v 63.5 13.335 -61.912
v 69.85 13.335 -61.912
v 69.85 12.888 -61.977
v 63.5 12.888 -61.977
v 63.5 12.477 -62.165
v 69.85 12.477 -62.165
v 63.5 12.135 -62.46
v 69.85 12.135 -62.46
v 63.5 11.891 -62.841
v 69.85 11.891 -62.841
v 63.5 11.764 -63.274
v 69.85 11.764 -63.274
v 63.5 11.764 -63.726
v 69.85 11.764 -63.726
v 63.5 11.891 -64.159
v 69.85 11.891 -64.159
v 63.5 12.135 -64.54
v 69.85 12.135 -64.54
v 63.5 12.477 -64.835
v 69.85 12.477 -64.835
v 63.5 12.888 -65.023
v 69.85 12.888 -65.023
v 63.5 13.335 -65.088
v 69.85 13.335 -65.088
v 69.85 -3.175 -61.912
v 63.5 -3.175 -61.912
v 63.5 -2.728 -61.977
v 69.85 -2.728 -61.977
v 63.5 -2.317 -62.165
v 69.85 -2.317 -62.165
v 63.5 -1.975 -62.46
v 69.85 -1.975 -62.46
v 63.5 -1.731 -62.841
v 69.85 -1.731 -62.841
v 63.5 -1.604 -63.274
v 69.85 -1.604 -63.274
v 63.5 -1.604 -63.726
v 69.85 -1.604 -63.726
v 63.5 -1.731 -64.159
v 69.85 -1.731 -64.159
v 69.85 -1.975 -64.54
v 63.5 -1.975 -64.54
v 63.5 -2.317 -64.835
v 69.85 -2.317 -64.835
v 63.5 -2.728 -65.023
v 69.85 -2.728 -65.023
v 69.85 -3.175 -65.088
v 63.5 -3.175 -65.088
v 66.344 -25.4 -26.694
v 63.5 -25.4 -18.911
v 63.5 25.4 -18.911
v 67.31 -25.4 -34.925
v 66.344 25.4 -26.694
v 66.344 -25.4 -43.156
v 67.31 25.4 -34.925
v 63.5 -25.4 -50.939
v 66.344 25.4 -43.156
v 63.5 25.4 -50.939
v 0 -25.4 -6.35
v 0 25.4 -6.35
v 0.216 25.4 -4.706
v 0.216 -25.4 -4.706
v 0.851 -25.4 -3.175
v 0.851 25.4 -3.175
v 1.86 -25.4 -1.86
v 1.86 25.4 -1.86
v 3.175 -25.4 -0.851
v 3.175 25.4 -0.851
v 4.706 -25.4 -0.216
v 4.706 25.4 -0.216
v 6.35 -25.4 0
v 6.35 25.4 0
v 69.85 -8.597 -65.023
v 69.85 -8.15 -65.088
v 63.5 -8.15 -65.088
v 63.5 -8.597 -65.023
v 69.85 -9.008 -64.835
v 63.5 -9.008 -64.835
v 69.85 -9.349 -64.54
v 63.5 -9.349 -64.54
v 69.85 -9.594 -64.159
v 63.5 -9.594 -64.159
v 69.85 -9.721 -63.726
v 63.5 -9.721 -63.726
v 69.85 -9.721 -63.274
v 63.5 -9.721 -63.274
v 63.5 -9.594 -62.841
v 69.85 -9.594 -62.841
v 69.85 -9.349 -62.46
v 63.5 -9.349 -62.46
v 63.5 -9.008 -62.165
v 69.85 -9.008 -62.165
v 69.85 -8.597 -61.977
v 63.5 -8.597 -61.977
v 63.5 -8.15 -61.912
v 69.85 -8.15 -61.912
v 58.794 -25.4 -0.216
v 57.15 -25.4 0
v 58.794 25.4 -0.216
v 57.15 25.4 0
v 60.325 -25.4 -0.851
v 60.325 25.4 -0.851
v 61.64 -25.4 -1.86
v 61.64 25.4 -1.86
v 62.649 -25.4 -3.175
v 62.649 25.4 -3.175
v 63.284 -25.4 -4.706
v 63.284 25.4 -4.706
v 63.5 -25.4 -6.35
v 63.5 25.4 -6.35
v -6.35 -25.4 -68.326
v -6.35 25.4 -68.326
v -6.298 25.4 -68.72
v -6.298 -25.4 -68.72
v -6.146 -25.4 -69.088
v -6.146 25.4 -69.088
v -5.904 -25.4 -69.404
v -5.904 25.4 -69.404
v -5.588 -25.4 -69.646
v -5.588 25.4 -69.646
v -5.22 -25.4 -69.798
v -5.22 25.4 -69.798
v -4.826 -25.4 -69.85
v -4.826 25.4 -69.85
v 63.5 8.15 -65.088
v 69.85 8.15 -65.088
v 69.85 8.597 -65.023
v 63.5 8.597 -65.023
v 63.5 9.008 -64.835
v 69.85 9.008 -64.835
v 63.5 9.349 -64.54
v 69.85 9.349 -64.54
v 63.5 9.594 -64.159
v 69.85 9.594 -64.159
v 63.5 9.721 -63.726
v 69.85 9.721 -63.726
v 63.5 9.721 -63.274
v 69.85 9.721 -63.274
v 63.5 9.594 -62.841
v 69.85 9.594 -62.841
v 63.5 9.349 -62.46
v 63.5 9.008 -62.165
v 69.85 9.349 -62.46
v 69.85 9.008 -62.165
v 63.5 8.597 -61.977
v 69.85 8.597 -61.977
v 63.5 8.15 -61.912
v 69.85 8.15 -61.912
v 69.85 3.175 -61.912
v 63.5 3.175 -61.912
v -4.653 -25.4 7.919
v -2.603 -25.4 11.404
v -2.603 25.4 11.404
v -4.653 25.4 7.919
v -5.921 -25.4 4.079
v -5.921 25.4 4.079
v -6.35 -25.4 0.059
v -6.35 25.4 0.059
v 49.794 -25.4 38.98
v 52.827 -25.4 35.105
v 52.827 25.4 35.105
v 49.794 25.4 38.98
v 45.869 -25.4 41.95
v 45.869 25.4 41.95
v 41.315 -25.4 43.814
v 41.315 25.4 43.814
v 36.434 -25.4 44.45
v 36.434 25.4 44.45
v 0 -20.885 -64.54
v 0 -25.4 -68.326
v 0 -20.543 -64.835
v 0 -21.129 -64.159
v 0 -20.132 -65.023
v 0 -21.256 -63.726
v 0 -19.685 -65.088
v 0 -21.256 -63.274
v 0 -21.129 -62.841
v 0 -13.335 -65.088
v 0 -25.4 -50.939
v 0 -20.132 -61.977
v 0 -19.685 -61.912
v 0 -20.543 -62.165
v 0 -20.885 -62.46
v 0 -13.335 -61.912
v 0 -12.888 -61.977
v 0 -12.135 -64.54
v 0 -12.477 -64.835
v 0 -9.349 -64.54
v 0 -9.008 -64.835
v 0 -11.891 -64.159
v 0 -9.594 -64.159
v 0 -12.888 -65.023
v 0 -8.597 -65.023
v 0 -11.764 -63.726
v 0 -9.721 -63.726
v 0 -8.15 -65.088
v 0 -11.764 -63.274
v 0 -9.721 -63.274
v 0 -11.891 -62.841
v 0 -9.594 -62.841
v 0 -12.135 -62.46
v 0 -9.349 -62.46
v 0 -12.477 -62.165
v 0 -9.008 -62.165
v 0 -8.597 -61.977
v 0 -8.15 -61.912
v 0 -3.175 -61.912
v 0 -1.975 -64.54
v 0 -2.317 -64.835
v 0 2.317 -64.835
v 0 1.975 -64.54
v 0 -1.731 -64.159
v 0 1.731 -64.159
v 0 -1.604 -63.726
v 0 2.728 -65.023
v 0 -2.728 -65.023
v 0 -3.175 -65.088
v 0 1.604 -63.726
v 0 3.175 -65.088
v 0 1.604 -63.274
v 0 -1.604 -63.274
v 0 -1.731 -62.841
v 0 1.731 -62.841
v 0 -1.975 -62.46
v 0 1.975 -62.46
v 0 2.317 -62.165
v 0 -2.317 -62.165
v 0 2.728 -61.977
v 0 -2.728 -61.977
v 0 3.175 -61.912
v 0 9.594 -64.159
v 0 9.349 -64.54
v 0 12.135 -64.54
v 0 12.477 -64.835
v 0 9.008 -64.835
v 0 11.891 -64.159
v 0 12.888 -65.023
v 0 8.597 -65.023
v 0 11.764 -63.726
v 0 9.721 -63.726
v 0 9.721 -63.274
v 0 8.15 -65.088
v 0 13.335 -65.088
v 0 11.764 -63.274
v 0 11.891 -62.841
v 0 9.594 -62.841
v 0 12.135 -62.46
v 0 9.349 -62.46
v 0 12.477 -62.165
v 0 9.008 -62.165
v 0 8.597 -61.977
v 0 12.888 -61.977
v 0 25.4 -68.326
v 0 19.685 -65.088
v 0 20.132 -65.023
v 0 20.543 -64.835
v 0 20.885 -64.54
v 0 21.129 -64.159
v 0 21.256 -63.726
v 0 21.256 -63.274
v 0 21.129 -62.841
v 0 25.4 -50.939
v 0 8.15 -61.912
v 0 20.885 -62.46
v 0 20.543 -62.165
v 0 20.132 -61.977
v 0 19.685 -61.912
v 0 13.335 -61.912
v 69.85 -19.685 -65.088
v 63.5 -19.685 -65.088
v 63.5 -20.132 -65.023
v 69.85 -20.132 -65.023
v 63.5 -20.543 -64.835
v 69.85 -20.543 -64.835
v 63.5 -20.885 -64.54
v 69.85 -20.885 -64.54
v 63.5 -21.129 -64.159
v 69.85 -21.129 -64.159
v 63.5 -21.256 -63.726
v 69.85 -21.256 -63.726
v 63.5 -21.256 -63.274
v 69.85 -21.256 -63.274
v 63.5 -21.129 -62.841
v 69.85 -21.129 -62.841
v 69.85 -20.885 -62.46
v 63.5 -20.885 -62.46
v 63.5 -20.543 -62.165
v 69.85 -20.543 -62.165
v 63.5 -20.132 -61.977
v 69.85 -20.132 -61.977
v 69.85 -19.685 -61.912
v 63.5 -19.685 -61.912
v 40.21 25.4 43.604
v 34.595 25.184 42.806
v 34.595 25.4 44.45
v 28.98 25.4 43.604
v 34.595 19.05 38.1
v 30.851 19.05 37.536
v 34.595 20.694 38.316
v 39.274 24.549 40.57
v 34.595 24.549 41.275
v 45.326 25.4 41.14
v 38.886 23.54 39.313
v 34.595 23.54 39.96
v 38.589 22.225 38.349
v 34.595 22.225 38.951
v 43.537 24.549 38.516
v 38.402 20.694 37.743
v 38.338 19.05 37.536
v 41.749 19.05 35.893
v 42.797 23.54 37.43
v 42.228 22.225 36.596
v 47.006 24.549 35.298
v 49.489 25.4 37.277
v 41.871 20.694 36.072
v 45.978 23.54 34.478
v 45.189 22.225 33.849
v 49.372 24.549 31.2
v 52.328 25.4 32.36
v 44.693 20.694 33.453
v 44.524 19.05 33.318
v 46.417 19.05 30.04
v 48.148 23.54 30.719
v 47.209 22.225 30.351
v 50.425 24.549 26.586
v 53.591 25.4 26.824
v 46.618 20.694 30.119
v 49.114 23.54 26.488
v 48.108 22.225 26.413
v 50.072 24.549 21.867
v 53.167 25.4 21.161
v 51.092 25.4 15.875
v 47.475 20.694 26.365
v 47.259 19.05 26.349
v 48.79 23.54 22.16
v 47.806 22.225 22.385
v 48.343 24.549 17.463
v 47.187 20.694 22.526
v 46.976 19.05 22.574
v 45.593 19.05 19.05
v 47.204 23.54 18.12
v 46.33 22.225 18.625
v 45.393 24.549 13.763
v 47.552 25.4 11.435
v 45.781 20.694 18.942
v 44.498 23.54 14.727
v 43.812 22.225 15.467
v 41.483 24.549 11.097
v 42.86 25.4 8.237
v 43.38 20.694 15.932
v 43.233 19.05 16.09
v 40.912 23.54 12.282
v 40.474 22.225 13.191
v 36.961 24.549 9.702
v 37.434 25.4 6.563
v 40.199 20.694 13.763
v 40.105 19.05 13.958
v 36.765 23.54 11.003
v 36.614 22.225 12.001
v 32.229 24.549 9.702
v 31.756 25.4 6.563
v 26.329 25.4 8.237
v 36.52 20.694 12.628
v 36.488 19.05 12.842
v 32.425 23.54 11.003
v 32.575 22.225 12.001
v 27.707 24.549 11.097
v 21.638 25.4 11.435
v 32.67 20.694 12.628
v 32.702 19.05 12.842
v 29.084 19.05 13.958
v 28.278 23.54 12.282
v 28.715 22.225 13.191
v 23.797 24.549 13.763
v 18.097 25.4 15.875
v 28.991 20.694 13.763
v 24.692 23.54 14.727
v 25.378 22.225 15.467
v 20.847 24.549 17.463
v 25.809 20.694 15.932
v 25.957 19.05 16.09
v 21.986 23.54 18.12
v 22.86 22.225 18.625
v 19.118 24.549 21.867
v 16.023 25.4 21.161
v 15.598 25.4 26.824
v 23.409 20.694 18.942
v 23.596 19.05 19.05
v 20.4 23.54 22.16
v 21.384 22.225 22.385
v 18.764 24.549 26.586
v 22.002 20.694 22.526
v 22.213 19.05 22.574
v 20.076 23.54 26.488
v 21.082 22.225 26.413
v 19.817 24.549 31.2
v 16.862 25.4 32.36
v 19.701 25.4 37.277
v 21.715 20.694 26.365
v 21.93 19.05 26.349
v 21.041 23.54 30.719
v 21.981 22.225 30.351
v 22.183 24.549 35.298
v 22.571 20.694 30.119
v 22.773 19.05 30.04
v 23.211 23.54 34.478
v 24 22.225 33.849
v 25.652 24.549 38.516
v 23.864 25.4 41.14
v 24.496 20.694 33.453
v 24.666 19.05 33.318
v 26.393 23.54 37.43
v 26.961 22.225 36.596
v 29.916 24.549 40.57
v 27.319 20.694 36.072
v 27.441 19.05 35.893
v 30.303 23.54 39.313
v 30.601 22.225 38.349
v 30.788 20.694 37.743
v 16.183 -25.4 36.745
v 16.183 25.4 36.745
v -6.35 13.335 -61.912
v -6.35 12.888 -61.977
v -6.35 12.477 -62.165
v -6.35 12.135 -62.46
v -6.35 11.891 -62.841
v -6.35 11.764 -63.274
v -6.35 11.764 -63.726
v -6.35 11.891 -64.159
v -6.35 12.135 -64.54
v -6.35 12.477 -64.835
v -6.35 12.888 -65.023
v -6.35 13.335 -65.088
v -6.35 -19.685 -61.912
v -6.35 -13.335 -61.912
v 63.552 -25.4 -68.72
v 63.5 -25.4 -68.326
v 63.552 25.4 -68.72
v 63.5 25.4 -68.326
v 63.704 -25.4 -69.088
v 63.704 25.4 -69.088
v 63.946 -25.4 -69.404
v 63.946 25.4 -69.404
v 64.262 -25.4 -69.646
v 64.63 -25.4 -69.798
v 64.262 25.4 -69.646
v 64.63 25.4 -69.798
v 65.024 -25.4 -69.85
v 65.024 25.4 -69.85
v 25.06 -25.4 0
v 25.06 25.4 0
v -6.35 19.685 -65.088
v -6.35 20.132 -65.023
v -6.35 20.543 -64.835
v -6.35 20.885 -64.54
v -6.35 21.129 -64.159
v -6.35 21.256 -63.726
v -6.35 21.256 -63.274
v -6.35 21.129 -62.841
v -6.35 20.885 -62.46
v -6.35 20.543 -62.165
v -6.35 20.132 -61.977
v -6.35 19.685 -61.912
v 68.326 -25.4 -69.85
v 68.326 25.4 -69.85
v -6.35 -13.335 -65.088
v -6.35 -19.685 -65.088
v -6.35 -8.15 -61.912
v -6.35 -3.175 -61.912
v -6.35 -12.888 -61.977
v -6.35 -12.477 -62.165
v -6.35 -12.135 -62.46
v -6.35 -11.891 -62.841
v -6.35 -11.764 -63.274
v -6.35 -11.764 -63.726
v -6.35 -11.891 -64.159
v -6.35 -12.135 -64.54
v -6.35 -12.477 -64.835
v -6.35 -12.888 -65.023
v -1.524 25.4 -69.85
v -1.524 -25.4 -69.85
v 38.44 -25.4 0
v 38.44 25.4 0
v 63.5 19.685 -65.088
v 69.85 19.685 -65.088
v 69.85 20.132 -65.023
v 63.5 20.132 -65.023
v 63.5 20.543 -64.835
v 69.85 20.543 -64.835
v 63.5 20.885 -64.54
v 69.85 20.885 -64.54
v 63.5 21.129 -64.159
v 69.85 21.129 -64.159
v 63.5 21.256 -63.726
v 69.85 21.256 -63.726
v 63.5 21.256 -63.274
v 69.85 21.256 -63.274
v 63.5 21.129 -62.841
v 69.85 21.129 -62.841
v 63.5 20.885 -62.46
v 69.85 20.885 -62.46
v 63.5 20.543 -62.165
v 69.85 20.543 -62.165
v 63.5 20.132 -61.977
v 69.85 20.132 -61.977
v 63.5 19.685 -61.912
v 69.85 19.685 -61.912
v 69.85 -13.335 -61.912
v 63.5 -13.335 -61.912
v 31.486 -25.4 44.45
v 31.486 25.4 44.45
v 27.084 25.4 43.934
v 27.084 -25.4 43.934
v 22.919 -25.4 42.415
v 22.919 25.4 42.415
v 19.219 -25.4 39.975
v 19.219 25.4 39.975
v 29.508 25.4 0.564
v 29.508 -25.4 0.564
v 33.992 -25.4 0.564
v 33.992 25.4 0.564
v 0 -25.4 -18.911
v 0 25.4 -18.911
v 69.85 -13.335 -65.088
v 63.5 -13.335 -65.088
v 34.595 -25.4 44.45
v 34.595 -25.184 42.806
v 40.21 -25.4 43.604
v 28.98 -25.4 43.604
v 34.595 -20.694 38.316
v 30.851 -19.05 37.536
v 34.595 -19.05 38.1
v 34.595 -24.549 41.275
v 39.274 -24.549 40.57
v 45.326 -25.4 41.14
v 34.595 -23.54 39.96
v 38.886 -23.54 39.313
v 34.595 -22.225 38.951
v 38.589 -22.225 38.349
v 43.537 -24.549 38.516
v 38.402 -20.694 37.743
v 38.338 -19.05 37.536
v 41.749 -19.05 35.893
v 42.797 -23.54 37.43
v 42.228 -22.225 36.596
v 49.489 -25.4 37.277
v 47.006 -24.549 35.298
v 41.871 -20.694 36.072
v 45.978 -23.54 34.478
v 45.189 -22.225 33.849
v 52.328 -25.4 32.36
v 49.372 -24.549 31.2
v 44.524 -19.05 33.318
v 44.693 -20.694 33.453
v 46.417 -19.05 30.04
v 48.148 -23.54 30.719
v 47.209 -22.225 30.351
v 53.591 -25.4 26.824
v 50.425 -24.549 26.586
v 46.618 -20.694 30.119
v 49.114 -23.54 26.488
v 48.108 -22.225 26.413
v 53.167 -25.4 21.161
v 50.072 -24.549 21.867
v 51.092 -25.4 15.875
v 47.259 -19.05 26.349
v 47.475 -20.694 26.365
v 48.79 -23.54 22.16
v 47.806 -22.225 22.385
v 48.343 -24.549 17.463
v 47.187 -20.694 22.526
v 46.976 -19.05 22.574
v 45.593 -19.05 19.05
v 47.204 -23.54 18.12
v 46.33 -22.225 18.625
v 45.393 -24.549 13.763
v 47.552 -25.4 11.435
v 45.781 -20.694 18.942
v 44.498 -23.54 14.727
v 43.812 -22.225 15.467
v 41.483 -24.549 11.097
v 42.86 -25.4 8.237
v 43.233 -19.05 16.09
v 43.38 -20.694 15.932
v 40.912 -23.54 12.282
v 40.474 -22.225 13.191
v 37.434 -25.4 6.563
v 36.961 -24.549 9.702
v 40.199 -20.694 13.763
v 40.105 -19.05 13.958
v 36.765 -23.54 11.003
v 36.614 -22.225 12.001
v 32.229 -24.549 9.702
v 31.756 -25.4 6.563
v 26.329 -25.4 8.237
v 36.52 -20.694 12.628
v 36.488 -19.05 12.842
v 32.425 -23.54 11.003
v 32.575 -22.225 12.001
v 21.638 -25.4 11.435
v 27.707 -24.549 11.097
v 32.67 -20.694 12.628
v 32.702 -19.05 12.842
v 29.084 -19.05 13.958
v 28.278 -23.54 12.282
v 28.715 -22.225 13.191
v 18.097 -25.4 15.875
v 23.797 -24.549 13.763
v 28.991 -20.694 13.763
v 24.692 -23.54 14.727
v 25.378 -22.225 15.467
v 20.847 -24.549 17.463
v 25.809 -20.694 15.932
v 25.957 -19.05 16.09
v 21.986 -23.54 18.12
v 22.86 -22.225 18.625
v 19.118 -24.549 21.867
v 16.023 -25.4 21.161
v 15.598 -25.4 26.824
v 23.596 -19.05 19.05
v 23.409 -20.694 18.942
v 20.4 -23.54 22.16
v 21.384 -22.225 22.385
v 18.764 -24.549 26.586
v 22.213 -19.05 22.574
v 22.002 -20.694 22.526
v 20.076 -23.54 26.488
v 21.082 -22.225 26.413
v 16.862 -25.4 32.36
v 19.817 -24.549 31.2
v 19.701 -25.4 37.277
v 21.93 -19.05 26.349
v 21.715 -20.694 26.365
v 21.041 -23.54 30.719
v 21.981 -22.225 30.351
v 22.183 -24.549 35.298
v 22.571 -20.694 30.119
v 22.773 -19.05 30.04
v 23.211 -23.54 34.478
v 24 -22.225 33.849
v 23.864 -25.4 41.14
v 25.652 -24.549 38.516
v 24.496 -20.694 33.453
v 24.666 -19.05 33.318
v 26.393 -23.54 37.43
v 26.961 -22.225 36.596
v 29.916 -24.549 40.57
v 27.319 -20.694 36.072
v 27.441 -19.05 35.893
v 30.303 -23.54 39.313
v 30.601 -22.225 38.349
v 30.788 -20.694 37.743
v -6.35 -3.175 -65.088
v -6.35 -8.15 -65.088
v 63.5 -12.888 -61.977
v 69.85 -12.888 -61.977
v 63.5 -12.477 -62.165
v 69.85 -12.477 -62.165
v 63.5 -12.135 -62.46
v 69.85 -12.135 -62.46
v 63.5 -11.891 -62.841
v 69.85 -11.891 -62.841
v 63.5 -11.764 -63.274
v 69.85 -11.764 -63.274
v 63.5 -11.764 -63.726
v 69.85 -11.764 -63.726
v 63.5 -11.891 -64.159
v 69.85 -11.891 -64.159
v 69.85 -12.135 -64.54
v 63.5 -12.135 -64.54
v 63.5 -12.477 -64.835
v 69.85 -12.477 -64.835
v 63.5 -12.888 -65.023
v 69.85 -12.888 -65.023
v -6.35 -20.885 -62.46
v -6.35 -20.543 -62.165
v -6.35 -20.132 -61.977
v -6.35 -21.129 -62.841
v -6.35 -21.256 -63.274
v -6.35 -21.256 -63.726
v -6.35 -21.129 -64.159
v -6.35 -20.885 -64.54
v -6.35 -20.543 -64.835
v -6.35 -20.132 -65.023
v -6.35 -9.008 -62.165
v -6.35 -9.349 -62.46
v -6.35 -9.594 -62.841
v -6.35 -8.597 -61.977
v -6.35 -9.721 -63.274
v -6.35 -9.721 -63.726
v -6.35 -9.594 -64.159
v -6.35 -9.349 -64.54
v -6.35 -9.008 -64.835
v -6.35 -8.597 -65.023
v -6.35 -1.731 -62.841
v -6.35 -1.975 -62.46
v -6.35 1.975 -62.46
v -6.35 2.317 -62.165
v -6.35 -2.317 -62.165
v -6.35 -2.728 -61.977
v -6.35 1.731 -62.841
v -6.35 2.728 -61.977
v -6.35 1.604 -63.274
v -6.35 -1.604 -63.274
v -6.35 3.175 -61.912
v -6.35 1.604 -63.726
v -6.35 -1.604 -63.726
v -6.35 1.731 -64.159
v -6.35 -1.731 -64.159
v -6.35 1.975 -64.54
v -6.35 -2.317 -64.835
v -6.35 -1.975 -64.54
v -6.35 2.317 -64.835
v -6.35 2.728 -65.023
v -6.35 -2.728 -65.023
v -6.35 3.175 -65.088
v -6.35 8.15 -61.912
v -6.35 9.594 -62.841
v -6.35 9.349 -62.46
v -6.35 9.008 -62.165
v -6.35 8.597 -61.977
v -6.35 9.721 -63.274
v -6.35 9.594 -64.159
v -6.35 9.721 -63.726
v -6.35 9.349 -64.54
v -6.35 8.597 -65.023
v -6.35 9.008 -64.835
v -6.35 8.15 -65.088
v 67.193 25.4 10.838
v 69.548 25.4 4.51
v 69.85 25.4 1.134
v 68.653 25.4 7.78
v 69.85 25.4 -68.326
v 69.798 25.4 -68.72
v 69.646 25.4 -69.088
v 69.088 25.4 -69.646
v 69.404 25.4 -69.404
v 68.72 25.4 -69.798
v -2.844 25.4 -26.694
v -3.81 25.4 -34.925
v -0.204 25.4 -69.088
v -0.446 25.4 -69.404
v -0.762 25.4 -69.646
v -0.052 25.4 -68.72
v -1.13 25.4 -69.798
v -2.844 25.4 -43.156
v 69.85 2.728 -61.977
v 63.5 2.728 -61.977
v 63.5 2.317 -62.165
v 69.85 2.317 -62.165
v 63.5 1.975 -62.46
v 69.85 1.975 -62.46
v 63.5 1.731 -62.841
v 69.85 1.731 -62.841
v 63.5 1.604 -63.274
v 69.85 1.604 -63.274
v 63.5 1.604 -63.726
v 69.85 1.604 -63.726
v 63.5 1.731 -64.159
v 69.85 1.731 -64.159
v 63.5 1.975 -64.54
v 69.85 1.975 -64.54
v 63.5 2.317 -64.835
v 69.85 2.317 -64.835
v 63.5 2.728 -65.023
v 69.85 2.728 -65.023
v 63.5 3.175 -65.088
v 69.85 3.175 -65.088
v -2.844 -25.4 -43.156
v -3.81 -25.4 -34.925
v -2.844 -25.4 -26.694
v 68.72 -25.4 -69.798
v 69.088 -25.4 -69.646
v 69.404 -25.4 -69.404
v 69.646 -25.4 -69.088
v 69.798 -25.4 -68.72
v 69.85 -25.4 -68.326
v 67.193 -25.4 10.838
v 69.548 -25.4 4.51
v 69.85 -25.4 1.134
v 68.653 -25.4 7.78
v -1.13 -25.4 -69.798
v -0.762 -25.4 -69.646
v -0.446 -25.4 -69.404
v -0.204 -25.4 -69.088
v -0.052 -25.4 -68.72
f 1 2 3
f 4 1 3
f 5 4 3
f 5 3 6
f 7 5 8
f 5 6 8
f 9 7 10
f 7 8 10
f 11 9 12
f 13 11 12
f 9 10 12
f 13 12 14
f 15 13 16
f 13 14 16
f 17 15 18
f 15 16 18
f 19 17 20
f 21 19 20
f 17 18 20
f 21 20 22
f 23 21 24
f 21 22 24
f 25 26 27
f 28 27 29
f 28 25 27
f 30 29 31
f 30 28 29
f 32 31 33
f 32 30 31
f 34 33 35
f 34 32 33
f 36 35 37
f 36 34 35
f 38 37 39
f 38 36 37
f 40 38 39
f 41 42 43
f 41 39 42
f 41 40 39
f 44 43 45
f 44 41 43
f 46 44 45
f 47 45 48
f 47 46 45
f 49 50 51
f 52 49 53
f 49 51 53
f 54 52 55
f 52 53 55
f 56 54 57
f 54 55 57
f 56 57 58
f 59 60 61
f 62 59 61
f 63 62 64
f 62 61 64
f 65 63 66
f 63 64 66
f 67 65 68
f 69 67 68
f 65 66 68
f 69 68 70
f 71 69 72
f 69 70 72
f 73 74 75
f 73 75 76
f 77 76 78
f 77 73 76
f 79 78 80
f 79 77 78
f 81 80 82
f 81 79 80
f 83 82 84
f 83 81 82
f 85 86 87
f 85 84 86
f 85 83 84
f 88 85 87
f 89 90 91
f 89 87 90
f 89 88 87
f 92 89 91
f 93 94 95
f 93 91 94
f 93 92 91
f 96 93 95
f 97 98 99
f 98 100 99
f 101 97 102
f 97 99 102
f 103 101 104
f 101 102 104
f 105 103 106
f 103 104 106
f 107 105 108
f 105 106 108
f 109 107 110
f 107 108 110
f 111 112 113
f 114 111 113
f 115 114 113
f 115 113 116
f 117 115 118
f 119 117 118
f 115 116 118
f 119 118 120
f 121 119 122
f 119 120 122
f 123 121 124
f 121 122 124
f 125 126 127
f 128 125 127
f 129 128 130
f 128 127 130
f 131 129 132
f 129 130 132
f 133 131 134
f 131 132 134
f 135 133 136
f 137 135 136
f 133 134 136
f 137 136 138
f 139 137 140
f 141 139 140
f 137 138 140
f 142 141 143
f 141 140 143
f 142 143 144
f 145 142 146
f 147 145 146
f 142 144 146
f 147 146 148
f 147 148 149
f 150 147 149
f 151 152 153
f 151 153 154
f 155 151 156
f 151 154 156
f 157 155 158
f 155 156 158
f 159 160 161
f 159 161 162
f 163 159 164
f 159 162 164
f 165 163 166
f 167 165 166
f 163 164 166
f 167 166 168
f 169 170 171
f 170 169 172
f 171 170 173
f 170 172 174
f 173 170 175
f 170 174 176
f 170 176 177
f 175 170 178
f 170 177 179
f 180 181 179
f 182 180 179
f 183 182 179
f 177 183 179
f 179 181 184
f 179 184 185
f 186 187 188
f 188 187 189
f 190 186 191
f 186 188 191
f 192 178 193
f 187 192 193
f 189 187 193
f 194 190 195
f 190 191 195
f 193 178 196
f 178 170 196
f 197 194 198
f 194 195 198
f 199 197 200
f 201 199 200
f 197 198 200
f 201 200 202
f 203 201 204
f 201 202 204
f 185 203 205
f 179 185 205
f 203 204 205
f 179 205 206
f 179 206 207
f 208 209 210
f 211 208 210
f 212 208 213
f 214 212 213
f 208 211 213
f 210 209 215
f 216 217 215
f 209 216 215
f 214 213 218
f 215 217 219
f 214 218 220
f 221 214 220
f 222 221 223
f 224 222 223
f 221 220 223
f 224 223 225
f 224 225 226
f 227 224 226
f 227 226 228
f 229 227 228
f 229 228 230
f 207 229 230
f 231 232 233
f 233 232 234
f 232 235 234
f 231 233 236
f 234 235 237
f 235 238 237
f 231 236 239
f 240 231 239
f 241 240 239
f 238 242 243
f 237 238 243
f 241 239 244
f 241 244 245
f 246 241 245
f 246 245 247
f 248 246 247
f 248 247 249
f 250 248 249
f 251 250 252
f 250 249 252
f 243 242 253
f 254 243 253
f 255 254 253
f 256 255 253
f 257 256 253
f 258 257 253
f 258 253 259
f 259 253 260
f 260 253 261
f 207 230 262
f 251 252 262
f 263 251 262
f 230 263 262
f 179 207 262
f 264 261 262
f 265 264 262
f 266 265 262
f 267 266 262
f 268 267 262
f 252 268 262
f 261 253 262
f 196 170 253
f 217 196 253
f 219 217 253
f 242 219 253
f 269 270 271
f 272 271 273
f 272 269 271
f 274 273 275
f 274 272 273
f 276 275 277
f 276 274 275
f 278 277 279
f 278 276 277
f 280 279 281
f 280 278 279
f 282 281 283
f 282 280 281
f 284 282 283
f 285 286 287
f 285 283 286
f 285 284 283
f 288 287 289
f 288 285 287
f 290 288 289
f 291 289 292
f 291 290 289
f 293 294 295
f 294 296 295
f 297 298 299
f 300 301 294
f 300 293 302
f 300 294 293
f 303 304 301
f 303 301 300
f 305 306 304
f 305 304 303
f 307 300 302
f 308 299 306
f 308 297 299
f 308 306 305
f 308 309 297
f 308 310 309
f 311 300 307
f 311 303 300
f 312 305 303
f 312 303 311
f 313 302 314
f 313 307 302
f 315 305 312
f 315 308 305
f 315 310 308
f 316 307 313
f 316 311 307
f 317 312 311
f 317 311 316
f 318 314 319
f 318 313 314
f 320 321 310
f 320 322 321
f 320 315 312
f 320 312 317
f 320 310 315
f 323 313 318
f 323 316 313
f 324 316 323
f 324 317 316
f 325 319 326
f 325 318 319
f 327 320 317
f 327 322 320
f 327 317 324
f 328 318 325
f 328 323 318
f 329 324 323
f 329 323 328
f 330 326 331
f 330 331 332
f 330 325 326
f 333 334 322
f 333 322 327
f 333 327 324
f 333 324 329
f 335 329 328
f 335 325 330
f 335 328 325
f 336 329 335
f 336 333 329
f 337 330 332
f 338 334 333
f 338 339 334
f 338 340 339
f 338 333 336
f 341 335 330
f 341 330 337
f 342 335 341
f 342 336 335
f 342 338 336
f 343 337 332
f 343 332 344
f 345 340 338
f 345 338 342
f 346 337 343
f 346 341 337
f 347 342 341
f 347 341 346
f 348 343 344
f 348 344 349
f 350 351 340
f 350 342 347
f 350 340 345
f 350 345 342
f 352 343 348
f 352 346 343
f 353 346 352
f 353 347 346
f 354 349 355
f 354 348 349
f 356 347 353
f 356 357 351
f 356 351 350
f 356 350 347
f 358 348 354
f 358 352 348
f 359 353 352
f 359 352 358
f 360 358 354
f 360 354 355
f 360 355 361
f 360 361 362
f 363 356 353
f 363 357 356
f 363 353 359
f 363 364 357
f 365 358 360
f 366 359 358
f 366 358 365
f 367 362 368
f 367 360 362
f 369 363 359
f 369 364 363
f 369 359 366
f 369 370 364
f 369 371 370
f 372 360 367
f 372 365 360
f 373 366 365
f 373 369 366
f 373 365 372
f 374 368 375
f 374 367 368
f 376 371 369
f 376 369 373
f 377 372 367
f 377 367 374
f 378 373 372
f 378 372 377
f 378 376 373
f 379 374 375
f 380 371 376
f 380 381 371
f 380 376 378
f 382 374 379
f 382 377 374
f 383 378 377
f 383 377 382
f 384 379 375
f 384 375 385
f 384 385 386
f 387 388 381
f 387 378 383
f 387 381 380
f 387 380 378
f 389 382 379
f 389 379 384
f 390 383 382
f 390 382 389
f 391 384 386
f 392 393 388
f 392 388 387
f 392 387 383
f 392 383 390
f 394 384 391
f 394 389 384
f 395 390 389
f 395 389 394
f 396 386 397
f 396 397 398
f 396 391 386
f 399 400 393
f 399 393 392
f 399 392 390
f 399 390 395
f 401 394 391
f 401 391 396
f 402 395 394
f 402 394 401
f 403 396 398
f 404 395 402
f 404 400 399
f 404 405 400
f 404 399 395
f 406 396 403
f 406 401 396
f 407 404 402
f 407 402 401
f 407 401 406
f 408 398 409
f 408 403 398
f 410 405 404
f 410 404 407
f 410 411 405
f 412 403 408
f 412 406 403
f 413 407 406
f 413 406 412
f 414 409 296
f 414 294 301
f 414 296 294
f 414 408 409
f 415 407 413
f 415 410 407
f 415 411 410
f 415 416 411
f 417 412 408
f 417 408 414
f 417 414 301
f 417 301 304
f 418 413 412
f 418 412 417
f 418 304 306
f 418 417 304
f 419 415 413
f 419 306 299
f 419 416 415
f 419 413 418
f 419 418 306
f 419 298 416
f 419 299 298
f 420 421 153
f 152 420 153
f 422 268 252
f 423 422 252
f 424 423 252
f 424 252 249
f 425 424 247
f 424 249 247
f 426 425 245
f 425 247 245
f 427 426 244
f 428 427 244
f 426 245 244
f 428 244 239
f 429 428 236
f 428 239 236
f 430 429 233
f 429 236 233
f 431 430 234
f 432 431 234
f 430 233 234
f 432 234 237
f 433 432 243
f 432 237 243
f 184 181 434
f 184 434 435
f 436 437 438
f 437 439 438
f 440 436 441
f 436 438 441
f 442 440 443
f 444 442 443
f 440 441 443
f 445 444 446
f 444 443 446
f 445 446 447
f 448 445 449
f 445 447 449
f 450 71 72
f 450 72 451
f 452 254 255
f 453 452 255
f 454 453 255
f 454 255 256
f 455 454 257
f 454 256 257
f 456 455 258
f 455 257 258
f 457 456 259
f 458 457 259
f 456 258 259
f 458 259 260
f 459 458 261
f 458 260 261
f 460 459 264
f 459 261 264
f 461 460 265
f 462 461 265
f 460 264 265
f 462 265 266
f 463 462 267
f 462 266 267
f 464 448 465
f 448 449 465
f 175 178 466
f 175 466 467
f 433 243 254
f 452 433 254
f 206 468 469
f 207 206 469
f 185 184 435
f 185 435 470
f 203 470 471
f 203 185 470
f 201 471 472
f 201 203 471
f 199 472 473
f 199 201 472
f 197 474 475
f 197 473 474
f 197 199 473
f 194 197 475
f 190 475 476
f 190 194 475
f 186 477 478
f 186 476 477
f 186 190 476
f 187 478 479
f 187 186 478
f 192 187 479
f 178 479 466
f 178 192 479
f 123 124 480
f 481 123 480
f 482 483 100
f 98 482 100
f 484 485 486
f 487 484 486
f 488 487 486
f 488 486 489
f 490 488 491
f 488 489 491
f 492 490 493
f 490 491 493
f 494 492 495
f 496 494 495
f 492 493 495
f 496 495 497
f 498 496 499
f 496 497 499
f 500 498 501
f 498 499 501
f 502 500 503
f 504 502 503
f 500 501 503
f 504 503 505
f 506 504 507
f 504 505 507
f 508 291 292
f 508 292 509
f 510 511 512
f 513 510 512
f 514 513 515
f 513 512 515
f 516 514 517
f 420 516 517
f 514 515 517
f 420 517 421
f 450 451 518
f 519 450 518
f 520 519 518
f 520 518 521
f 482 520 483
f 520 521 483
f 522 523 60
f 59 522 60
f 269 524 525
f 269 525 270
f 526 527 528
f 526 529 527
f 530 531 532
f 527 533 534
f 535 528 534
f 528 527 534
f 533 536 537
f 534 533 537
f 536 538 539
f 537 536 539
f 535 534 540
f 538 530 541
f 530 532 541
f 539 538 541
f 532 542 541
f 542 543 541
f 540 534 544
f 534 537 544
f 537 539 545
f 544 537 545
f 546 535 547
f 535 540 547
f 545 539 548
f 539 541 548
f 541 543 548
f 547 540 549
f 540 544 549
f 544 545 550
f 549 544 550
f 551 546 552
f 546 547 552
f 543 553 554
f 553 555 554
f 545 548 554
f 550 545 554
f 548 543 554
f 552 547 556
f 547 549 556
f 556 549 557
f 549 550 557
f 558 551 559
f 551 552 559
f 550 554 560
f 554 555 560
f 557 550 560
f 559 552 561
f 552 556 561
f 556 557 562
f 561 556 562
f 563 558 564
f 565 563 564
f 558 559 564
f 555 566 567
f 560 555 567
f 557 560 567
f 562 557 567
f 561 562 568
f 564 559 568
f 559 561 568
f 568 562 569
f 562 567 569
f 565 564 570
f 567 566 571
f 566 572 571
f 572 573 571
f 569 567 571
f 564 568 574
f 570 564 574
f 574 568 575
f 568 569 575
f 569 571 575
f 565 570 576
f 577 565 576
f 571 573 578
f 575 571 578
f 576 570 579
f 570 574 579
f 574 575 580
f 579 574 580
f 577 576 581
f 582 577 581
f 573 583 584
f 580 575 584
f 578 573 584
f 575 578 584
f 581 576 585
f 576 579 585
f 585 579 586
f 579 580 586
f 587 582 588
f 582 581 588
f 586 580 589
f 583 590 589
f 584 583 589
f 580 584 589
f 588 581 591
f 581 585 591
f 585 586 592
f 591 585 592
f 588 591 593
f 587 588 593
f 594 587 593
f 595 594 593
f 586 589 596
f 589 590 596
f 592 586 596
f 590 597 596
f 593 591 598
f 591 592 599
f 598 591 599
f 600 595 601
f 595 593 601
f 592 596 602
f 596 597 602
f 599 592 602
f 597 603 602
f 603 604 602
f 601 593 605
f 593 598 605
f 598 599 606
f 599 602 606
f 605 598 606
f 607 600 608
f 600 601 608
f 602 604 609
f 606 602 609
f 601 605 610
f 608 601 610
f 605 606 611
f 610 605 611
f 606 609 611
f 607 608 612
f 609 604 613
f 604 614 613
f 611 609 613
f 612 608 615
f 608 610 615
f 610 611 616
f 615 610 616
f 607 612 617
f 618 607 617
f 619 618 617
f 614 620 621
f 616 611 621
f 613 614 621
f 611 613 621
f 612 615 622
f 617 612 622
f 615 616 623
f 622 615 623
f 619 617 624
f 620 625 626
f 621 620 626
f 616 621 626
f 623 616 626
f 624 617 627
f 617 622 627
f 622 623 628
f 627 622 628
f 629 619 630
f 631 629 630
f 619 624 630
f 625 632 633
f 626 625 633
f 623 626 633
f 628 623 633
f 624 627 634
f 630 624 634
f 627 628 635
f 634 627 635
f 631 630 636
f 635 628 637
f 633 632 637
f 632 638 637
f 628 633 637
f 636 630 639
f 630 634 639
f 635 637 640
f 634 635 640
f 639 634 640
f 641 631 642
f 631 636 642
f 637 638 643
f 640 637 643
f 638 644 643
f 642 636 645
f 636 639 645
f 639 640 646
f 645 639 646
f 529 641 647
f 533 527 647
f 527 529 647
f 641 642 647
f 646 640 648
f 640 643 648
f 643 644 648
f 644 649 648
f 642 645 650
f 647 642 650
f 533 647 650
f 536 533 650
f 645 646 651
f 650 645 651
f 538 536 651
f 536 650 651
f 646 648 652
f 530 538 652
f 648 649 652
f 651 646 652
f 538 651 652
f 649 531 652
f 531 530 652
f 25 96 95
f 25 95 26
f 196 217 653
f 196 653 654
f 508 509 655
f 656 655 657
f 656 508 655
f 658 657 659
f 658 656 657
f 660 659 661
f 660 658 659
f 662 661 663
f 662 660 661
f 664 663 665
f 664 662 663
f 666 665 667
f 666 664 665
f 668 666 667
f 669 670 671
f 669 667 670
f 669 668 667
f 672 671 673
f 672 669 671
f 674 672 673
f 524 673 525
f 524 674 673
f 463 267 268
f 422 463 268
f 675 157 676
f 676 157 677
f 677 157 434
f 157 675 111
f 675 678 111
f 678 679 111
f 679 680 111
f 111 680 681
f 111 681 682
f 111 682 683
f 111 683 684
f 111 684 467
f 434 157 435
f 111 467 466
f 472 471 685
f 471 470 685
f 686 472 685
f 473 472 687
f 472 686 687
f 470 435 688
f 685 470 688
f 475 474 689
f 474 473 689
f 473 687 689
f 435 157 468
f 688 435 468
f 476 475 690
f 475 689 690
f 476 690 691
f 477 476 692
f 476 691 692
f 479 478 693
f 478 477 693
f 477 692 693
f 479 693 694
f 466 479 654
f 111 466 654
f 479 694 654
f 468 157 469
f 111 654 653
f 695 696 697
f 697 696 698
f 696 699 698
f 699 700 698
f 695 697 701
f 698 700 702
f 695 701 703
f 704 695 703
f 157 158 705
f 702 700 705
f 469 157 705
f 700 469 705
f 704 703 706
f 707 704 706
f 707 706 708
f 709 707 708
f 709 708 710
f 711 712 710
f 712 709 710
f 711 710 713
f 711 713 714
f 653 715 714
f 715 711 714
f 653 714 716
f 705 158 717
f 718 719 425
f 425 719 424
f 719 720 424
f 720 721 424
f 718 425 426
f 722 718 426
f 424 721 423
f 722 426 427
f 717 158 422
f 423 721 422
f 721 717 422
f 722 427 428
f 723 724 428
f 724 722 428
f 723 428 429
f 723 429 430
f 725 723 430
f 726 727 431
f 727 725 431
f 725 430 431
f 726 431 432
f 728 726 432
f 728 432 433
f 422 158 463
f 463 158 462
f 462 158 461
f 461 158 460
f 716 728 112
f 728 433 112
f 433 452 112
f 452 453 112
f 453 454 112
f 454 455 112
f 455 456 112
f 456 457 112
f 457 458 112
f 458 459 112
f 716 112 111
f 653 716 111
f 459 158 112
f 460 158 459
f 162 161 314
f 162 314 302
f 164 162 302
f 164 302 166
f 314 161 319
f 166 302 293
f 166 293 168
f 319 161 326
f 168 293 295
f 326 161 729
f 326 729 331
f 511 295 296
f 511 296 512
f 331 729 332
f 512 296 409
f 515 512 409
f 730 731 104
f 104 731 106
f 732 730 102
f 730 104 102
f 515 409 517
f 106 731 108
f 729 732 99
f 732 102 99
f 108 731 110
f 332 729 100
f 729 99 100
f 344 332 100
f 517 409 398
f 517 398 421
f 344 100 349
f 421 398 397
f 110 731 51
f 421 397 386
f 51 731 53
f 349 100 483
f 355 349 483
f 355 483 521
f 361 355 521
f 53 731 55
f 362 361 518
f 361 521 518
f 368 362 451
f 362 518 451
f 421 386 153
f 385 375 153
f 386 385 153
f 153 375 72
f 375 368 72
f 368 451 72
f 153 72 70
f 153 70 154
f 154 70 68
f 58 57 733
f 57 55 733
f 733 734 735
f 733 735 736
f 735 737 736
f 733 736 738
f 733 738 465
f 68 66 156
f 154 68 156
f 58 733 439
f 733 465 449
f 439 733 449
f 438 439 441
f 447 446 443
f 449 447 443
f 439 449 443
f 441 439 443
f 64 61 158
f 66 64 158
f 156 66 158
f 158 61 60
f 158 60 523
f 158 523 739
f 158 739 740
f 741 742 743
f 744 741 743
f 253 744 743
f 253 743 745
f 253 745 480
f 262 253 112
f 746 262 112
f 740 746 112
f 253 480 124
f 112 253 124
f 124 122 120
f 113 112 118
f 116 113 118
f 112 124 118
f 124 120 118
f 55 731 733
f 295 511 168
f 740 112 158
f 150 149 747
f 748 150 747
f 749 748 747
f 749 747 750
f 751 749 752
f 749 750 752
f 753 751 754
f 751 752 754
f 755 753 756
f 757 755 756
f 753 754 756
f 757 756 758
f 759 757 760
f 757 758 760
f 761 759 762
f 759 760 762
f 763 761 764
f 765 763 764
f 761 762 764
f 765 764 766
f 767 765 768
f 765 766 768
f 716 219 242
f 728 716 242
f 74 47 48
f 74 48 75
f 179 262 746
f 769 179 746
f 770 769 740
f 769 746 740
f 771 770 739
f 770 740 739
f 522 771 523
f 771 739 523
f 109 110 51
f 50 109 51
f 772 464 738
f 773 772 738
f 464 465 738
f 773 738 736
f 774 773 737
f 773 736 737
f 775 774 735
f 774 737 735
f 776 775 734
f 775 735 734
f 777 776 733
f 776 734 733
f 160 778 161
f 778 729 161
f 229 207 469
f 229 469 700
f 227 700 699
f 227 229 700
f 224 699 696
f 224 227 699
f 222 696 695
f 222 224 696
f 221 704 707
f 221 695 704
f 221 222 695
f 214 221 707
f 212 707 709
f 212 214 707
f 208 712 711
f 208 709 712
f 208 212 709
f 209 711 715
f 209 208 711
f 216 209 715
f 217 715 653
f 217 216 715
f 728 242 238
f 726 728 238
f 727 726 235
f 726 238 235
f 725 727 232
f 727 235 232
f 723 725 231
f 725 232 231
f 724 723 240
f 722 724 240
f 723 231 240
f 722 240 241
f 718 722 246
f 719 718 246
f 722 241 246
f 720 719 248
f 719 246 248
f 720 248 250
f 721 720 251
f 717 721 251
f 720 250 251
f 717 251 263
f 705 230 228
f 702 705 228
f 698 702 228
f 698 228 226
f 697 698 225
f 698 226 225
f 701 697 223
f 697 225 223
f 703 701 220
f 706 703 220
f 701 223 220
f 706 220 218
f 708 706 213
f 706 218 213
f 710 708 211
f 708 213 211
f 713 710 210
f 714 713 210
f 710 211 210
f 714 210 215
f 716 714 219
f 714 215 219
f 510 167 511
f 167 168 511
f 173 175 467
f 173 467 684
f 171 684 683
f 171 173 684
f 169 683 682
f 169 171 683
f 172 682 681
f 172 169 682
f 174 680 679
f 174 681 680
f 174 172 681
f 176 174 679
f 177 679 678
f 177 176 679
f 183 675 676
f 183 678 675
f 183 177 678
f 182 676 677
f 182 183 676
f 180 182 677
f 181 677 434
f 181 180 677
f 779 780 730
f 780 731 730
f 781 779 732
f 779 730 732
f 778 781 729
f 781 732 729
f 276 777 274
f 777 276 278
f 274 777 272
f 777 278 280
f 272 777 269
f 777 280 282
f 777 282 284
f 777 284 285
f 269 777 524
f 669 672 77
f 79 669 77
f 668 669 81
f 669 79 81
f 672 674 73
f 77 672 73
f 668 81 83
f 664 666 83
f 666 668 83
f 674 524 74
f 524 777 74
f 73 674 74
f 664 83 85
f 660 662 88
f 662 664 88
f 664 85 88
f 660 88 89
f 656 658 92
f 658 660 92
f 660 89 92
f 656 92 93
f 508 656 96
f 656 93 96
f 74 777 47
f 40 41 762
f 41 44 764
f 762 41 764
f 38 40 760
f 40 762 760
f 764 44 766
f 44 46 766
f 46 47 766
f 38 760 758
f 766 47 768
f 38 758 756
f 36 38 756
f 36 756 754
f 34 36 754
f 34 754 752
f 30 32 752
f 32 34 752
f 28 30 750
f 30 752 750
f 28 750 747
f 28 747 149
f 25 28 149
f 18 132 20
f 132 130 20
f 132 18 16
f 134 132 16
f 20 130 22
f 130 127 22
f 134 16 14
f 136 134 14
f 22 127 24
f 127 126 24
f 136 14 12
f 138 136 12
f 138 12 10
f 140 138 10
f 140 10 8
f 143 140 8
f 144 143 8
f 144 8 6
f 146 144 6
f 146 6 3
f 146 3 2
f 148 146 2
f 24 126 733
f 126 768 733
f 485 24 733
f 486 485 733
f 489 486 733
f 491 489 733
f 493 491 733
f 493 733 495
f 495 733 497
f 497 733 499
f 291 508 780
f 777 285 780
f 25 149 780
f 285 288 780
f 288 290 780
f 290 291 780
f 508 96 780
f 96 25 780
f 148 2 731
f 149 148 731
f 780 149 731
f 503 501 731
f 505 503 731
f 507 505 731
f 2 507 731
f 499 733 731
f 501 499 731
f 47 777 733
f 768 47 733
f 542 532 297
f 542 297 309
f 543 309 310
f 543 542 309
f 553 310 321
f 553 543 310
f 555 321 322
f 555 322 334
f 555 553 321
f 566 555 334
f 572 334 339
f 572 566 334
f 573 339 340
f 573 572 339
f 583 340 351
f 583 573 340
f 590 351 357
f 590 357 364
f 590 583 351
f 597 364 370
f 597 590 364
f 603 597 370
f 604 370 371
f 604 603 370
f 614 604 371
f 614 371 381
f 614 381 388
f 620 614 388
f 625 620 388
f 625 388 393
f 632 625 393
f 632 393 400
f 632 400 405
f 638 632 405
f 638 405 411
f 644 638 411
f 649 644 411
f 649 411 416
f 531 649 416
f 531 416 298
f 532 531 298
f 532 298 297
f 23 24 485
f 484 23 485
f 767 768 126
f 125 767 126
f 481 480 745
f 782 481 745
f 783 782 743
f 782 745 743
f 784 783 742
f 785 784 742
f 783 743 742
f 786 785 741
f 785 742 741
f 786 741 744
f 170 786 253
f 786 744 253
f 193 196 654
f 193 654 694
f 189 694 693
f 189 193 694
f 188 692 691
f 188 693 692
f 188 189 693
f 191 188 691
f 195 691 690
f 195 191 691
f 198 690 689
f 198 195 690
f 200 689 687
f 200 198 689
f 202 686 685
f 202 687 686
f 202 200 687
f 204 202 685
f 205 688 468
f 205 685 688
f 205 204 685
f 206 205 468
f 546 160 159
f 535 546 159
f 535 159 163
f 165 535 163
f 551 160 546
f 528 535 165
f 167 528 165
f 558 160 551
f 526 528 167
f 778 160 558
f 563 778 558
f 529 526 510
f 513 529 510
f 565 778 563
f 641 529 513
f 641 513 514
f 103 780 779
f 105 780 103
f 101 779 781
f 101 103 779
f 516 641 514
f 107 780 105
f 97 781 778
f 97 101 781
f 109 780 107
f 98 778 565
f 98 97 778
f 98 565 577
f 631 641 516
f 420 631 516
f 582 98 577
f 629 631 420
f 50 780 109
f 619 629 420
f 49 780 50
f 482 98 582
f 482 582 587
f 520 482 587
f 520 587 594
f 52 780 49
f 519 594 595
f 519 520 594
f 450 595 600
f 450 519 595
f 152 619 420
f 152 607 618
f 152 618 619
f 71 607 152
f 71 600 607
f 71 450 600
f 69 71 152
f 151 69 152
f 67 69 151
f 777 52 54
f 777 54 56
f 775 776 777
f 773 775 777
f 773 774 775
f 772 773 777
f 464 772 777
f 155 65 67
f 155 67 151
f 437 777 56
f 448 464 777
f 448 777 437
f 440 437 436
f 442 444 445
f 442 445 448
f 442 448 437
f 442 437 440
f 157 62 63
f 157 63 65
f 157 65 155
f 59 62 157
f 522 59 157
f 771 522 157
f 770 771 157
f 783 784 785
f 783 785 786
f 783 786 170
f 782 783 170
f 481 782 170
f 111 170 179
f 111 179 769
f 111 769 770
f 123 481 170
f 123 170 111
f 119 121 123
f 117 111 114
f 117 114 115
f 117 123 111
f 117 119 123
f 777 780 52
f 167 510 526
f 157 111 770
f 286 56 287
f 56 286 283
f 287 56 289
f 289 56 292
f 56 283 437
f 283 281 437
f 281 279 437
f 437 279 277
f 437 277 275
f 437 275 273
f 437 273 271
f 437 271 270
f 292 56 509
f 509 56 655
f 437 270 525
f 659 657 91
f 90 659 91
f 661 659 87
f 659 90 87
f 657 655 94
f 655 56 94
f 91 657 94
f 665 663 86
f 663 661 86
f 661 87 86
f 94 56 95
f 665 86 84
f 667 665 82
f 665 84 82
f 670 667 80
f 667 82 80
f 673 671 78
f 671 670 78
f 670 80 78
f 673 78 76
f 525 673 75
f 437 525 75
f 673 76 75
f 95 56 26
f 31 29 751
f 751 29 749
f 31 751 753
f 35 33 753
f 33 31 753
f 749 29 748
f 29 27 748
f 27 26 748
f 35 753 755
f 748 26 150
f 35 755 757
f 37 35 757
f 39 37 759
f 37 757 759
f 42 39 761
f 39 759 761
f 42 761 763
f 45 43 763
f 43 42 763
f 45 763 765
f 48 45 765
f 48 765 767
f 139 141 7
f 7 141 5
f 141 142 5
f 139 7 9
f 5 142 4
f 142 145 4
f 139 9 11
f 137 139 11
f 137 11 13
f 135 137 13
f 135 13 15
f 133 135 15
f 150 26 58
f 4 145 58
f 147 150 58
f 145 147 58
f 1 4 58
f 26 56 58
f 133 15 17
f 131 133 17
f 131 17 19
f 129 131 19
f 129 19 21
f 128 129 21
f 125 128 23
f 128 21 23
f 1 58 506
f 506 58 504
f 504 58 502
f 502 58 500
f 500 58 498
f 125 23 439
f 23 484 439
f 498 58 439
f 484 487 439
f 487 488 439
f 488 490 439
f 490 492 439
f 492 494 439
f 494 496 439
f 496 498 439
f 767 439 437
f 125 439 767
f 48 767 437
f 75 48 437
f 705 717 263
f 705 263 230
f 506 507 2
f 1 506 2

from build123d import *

# Parameters (mm, degrees)
SKETCH1_R           = 12.7
BOSS_EXTRUDE1_DEPTH = 25.4
SKETCH2_R           = 35.56
CUT_EXTRUDE1_DEPTH  = 50.8
CUT_EXTRUDE2_DEPTH  = 127
FILLET1_R           = 6.35


with BuildPart() as part:
    # Sketch1 → Boss-Extrude1 (new, symmetric)
    with BuildSketch(Plane(origin=(0, 0, 0), x_dir=(1, 0, 0), z_dir=(0, 1, 0))):
        with BuildLine():
            Line((6.35, 0), (57.15, 0))
            ThreePointArc((57.15, 0), (61.640128061, 1.859871939), (63.5, 6.35))
            Line((63.5, 6.35), (63.5, 68.326))
            ThreePointArc((63.5, 68.326), (63.946369265, 69.403630735), (65.024, 69.85))
            Line((65.024, 69.85), (68.326, 69.85))
            ThreePointArc((68.326, 69.85), (69.403630735, 69.403630735), (69.85, 68.326))
            Line((69.85, 68.326), (69.85, -1.133947157))
            ThreePointArc((69.85, -1.133947157), (69.173698323, -6.16482282), (67.192812606, -10.83849222))
            Line((67.192812606, -10.83849222), (52.827309323, -35.104545063))
            ThreePointArc((52.827309323, -35.104545063), (45.869297101, -41.949532976), (36.434496717, -44.45))
            Line((36.434496717, -44.45), (31.486207829, -44.45))
            ThreePointArc((31.486207829, -44.45), (22.919370647, -42.415046303), (16.182781968, -36.744939705))
            Line((16.182781968, -36.744939705), (-2.603425861, -11.403832022))
            ThreePointArc((-2.603425861, -11.403832022), (-5.389123288, -6.032678275), (-6.35, -0.058892317))
            Line((-6.35, -0.058892317), (-6.35, 68.326))
            ThreePointArc((-6.35, 68.326), (-5.903630735, 69.403630735), (-4.826, 69.85))
            Line((-4.826, 69.85), (-1.524, 69.85))
            ThreePointArc((-1.524, 69.85), (-0.446369265, 69.403630735), (0, 68.326))
            Line((0, 68.326), (0, 6.35))
            ThreePointArc((0, 6.35), (1.859871939, 1.859871939), (6.35, 0))
        make_face()
        with Locations(Location((34.5948, -25.4, 0), (0, 0, 270))):
            Circle(SKETCH1_R, mode=Mode.SUBTRACT)
    extrude(amount=BOSS_EXTRUDE1_DEPTH, both=True)

    # Sketch2 → Cut-Extrude1 (cut)
    with BuildSketch(Plane(origin=(0, 25.4, 0), x_dir=(1, 0, 0), z_dir=(0, 1, 0))):
        with Locations((31.75, 34.925)):
            Circle(SKETCH2_R)
    extrude(amount=-CUT_EXTRUDE1_DEPTH, mode=Mode.SUBTRACT)

    # Sketch3 → Cut-Extrude2 (cut)
    with BuildSketch(Plane(origin=(69.85, 0, 0), x_dir=(0, 0, -1), z_dir=(1, 0, 0))):
        with BuildLine():
            Line((65.0875, -3.175), (65.0875, -8.149687283))
            ThreePointArc((65.0875, -8.149687283), (63.5, -9.737187283), (61.9125, -8.149687283))
            Line((61.9125, -8.149687283), (61.9125, -3.175))
            ThreePointArc((61.9125, -3.175), (63.5, -1.5875), (65.0875, -3.175))
        make_face()
        with BuildLine():
            Line((65.0875, -13.335), (65.0875, -19.685))
            ThreePointArc((65.0875, -19.685), (63.5, -21.2725), (61.9125, -19.685))
            Line((61.9125, -19.685), (61.9125, -13.335))
            ThreePointArc((61.9125, -13.335), (63.5, -11.7475), (65.0875, -13.335))
        make_face()
        with BuildLine():
            Line((65.0875, 13.335), (65.0875, 19.685))
            ThreePointArc((65.0875, 19.685), (63.5, 21.2725), (61.9125, 19.685))
            Line((61.9125, 19.685), (61.9125, 13.335))
            ThreePointArc((61.9125, 13.335), (63.5, 11.7475), (65.0875, 13.335))
        make_face()
        with BuildLine():
            Line((65.0875, 3.175), (65.0875, 8.149687283))
            ThreePointArc((65.0875, 8.149687283), (63.5, 9.737187283), (61.9125, 8.149687283))
            Line((61.9125, 8.149687283), (61.9125, 3.175))
            ThreePointArc((61.9125, 3.175), (63.5, 1.5875), (65.0875, 3.175))
        make_face()
    extrude(amount=-CUT_EXTRUDE2_DEPTH, mode=Mode.SUBTRACT)

    # Fillet1
    fillet1_edges = [part.edges().sort_by_distance(p)[0] for p in [
        (34.5948, -25.4, 12.7),
        (34.5948, 25.4, 12.7),
    ]]
    fillet(fillet1_edges, radius=FILLET1_R - 0.0001)  # a hair under: the kernel refuses the full size


solid = part.part
